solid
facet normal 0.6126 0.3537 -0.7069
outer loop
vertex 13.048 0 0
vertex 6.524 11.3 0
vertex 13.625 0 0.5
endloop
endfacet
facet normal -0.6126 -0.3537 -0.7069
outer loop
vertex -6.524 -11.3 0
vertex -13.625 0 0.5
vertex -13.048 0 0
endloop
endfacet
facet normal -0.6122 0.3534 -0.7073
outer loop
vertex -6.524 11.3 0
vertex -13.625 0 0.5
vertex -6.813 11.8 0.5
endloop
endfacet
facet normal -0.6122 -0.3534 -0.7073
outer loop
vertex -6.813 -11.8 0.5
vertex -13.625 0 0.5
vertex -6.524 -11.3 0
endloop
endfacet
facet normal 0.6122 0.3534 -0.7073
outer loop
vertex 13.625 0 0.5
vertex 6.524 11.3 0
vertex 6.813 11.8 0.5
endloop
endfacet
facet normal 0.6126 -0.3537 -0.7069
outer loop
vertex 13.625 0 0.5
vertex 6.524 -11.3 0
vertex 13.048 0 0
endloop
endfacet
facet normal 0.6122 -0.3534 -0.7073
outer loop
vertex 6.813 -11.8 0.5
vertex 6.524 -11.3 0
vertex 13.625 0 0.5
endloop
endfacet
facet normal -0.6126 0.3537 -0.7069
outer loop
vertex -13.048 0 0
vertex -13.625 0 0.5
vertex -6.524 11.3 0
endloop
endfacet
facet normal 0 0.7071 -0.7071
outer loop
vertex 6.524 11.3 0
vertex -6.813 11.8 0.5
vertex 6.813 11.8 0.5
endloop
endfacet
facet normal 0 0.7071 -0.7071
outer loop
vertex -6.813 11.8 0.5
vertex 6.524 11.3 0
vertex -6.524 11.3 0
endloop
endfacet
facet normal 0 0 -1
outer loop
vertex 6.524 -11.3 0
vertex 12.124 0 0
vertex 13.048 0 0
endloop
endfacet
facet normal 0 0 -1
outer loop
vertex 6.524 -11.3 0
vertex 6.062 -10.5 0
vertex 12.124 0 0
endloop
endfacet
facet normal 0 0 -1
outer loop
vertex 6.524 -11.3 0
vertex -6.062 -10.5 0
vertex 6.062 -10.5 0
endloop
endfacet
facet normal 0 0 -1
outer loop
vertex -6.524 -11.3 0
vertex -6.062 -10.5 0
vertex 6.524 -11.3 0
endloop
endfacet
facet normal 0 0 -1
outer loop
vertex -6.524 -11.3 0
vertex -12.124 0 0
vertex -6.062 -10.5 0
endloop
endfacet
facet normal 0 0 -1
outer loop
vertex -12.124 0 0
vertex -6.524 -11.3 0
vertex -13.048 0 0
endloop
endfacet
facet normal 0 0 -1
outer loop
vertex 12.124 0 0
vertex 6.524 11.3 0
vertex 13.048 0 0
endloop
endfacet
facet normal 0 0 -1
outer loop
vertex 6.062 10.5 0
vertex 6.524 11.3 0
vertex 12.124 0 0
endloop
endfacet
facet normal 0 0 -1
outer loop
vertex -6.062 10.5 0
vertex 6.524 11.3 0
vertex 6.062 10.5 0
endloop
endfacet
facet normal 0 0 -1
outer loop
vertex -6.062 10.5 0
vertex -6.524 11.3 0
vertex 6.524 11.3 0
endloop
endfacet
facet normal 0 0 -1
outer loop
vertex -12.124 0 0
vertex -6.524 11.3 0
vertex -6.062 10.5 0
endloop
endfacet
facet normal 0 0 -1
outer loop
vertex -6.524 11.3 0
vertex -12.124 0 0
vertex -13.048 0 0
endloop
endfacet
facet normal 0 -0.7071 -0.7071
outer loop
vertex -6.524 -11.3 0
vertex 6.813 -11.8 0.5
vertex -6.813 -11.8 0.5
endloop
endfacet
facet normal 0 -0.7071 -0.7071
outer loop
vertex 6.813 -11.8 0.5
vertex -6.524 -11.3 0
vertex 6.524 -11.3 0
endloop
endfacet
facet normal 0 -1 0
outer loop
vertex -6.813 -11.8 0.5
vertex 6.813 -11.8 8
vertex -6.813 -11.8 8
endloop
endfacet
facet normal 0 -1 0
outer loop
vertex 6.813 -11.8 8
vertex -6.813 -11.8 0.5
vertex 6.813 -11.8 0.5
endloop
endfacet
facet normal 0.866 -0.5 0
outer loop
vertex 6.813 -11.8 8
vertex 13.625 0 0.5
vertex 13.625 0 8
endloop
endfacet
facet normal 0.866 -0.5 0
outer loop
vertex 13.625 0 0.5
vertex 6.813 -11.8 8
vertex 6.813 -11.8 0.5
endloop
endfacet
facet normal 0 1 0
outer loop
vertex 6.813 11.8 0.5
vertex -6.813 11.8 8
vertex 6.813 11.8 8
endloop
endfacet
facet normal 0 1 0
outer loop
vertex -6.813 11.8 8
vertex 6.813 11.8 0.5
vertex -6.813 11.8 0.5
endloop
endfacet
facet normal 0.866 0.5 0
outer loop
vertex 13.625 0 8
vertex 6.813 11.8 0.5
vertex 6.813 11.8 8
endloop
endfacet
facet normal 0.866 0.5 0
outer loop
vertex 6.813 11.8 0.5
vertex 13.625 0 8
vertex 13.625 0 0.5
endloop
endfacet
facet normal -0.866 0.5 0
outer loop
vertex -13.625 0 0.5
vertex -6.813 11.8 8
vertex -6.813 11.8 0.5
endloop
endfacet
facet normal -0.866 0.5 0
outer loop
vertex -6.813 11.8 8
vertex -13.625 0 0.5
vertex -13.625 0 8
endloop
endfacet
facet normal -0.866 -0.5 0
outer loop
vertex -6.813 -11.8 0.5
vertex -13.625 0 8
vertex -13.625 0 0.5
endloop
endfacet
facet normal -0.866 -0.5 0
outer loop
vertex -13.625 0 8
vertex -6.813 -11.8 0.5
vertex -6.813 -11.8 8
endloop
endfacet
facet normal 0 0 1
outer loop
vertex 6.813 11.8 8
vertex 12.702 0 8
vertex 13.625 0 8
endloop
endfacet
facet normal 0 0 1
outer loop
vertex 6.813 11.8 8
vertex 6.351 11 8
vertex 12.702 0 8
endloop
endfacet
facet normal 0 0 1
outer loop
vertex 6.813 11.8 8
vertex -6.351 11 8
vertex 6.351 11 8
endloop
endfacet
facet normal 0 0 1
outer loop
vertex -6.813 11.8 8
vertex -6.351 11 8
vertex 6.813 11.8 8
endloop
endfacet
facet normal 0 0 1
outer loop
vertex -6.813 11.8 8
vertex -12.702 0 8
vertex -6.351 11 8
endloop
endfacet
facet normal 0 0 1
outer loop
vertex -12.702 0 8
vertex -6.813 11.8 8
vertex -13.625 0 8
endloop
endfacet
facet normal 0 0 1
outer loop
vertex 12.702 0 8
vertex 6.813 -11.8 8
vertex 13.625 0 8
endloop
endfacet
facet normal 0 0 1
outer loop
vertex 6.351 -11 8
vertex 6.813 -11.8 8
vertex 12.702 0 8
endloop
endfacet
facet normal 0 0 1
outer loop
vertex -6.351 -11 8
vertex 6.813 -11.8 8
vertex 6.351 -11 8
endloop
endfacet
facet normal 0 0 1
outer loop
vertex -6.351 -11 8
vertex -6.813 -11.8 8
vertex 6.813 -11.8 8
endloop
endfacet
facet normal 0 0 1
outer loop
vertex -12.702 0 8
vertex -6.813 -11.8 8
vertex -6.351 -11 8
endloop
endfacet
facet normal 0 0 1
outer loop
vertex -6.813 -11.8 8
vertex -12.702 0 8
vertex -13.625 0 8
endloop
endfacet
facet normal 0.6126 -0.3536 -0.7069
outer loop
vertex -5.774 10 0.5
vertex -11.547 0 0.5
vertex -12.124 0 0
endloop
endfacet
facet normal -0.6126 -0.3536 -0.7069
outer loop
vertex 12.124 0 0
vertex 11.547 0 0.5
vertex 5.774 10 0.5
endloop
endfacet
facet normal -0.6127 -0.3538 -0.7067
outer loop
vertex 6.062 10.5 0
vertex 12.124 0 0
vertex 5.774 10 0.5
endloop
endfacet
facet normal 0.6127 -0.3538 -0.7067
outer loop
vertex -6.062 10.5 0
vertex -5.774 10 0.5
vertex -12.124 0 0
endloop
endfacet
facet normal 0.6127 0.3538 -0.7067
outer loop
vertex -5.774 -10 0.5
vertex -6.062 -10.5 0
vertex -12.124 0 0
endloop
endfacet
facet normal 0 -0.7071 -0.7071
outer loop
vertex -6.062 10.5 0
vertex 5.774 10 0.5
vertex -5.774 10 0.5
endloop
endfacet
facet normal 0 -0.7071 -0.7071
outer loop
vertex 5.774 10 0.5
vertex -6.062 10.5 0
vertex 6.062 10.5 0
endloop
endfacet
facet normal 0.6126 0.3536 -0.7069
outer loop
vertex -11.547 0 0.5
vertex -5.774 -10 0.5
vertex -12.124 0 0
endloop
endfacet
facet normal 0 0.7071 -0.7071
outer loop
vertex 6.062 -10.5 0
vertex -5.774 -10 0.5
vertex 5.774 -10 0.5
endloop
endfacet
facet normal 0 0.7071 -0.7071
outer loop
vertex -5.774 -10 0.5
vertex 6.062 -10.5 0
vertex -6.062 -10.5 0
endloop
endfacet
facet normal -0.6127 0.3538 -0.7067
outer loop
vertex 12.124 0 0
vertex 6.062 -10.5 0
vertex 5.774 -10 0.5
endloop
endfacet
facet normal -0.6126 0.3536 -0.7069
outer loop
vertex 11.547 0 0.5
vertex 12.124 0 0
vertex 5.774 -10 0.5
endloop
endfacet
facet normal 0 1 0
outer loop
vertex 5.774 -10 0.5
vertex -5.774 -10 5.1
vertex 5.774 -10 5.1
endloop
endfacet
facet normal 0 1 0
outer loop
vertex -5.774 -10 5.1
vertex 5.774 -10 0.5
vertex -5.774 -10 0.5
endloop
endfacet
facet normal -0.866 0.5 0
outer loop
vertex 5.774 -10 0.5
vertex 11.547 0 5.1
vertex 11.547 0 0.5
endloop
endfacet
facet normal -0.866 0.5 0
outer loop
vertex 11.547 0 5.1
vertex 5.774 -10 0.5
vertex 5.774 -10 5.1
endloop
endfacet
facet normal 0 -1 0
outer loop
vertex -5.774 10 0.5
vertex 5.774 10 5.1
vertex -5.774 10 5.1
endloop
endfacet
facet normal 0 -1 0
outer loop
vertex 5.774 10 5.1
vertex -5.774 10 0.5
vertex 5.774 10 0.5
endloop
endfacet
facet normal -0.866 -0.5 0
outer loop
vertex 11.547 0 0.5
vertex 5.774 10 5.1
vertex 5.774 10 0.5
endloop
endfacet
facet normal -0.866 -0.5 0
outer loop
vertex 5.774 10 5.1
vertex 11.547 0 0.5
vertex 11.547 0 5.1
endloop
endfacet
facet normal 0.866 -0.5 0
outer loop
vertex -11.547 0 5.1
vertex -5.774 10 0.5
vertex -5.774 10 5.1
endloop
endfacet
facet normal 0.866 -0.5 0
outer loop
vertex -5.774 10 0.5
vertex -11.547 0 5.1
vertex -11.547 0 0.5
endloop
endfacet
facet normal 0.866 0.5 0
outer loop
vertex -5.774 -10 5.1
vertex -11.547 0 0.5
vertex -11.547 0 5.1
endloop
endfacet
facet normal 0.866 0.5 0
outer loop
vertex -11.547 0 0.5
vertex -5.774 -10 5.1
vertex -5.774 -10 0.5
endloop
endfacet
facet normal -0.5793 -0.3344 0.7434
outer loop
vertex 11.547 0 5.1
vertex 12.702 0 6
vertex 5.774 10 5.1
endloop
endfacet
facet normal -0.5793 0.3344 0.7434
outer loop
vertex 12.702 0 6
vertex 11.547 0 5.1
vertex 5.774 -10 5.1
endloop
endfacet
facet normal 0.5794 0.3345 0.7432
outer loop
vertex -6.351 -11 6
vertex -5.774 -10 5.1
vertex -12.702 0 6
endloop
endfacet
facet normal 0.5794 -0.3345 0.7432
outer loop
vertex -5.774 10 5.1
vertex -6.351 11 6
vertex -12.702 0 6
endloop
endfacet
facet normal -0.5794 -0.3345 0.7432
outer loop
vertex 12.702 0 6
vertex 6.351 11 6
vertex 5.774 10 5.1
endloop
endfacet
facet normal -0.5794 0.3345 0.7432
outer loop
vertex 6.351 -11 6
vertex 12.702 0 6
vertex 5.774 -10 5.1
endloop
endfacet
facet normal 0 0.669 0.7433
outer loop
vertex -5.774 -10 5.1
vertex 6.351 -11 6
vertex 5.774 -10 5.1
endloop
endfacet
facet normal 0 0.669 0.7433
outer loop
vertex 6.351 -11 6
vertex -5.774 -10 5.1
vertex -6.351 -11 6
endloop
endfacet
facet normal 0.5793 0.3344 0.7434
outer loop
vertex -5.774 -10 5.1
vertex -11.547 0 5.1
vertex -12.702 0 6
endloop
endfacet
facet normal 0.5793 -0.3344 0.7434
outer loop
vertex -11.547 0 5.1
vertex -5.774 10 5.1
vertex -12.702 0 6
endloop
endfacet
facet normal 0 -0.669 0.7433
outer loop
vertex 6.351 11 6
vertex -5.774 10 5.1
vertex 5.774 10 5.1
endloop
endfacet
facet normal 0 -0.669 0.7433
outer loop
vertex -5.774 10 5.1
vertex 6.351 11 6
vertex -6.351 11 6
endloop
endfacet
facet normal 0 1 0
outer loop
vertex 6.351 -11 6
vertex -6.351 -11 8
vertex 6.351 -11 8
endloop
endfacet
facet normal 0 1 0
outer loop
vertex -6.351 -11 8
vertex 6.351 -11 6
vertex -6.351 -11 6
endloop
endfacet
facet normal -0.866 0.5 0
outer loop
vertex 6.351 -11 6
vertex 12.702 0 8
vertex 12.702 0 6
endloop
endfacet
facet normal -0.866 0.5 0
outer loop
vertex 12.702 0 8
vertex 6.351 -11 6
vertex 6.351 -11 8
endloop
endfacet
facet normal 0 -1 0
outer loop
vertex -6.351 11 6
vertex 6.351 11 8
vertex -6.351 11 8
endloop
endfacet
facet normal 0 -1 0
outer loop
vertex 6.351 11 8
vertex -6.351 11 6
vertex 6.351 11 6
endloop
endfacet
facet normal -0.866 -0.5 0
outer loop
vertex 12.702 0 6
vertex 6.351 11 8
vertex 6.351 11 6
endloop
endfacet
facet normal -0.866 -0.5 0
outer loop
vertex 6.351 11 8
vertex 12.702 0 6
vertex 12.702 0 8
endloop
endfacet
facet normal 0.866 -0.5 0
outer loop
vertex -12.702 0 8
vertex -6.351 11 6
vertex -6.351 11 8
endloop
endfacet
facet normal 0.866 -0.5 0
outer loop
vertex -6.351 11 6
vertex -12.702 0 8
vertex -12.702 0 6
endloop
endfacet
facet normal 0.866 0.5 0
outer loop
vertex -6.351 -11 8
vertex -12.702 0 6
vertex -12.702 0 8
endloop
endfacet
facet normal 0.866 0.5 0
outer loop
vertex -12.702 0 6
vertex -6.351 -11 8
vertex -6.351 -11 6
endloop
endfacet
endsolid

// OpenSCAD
//=============================================================================
// honeycomb-honeycomb.scad
//
// a parametric honeycomb-shaped grid
//=============================================================================
// Written in 2022 by Patrick Barrett
//
// To the extent possible under law, the author(s) have dedicated all copyright
// and related and neighboring rights to this work to the public domain
// worldwide. This work is distributed without any warranty.
//
// See <http://creativecommons.org/publicdomain/zero/1.0/> for full dedication.
//=============================================================================

// dimensions
x = 1; // cell count, vertical
y = 1; // cell count, horizontal

shape = "hexagon"; // [hexagon|rectangle], overall shape

di = 20; // mm, main pod well indiameter (flat to flat distance)
di_notch = 22; // mm, main pod well indiameter (flat to flat distance)

cell_wall = 3.6/2; // mm, cell side wall size
cell_depth = 8;

front_bevel = 0.5; // mm

// customizable variables end here

abit = 0.001; //use for making overlap to get single manifold stl
alot = 150;

Di = di * (2/sqrt(3)); // mm, circumdiameter of inner side of honeycomb

do = di + (2*cell_wall); // mm, inradius of outter side of honeycomb
Do = do * (2/sqrt(3)); // mm, circumdiameter of outter side of honeycomb

dm = (di+do)/2; // mm, inradius of median of honeycomb
Dm = (Di+Do)/2; // mm, circumdiameter of median of honeycomb

x_min = -floor(x/2);
x_max = floor(x/2);
y_min = -floor(y/2);
y_max = floor(y/2);

// each pod cell
module cell() {
    union() {
        difference() {
            union() {
            Dob = (do - (front_bevel * 2)) * (2/sqrt(3));
            
            cylinder(d1 = Dob, d2 = Do, h = front_bevel, $fn = 6);
            translate([0,0,front_bevel])
            cylinder(d = Do, h = cell_depth - 0.5, $fn = 6);
            }
            
            // cuts, bottom to top
            d1 = (di + (front_bevel * 2)) * (2/sqrt(3));
            d2 = Di;
            d3 = di_notch * (2/sqrt(3));
            
            h1 = front_bevel;
            h2 = 4.6;
            h3 = 0.9;
            h4 = 8;
            translate([0,0,-1])
            cylinder(d = d1, h = 1, $fn = 6);
            translate([0,0,0])
            cylinder(d1 = d1, d2=d2, h = h1, $fn = 6);
            translate([0,0,h1])
            cylinder(d=d2, h = h2, $fn = 6);
            translate([0,0,h1+h2])
            cylinder(d1=d2, d2=d3, h = h3, $fn = 6);
            translate([0,0,h1+h2+h3])
            cylinder(d=d3, h = h4, $fn = 6);
        }
    }
}


module arrange_on_honeycomb() {
    for(i = [x_min:x_max]){
        for(j=[ for (jj=[y_min:y_max]) jj+(0.5 * abs(i%2))]){
            // ^^^ adds 0.5 to odd cols ^^^
            hide = abs(j) > -0.5*(abs(i)) + (y_max - 0.5 * min(0, y_max-x_max))
              || abs(j) > y_max;
            
            if (!hide) {
                x = i * (do * sqrt(3)/2);
                y = j * do;
                translate([x,y,0])
                children();
            }
        }
    }
}

//projection()
difference() {
union() {
    // main cells
    arrange_on_honeycomb(){
        cell();
    }
}
//
//    translate([-39,13.25,0])
//    rotate([0,0,-90])
//    import("/home/patrick/downloads/wall-honeycomb-part.stl");

}
